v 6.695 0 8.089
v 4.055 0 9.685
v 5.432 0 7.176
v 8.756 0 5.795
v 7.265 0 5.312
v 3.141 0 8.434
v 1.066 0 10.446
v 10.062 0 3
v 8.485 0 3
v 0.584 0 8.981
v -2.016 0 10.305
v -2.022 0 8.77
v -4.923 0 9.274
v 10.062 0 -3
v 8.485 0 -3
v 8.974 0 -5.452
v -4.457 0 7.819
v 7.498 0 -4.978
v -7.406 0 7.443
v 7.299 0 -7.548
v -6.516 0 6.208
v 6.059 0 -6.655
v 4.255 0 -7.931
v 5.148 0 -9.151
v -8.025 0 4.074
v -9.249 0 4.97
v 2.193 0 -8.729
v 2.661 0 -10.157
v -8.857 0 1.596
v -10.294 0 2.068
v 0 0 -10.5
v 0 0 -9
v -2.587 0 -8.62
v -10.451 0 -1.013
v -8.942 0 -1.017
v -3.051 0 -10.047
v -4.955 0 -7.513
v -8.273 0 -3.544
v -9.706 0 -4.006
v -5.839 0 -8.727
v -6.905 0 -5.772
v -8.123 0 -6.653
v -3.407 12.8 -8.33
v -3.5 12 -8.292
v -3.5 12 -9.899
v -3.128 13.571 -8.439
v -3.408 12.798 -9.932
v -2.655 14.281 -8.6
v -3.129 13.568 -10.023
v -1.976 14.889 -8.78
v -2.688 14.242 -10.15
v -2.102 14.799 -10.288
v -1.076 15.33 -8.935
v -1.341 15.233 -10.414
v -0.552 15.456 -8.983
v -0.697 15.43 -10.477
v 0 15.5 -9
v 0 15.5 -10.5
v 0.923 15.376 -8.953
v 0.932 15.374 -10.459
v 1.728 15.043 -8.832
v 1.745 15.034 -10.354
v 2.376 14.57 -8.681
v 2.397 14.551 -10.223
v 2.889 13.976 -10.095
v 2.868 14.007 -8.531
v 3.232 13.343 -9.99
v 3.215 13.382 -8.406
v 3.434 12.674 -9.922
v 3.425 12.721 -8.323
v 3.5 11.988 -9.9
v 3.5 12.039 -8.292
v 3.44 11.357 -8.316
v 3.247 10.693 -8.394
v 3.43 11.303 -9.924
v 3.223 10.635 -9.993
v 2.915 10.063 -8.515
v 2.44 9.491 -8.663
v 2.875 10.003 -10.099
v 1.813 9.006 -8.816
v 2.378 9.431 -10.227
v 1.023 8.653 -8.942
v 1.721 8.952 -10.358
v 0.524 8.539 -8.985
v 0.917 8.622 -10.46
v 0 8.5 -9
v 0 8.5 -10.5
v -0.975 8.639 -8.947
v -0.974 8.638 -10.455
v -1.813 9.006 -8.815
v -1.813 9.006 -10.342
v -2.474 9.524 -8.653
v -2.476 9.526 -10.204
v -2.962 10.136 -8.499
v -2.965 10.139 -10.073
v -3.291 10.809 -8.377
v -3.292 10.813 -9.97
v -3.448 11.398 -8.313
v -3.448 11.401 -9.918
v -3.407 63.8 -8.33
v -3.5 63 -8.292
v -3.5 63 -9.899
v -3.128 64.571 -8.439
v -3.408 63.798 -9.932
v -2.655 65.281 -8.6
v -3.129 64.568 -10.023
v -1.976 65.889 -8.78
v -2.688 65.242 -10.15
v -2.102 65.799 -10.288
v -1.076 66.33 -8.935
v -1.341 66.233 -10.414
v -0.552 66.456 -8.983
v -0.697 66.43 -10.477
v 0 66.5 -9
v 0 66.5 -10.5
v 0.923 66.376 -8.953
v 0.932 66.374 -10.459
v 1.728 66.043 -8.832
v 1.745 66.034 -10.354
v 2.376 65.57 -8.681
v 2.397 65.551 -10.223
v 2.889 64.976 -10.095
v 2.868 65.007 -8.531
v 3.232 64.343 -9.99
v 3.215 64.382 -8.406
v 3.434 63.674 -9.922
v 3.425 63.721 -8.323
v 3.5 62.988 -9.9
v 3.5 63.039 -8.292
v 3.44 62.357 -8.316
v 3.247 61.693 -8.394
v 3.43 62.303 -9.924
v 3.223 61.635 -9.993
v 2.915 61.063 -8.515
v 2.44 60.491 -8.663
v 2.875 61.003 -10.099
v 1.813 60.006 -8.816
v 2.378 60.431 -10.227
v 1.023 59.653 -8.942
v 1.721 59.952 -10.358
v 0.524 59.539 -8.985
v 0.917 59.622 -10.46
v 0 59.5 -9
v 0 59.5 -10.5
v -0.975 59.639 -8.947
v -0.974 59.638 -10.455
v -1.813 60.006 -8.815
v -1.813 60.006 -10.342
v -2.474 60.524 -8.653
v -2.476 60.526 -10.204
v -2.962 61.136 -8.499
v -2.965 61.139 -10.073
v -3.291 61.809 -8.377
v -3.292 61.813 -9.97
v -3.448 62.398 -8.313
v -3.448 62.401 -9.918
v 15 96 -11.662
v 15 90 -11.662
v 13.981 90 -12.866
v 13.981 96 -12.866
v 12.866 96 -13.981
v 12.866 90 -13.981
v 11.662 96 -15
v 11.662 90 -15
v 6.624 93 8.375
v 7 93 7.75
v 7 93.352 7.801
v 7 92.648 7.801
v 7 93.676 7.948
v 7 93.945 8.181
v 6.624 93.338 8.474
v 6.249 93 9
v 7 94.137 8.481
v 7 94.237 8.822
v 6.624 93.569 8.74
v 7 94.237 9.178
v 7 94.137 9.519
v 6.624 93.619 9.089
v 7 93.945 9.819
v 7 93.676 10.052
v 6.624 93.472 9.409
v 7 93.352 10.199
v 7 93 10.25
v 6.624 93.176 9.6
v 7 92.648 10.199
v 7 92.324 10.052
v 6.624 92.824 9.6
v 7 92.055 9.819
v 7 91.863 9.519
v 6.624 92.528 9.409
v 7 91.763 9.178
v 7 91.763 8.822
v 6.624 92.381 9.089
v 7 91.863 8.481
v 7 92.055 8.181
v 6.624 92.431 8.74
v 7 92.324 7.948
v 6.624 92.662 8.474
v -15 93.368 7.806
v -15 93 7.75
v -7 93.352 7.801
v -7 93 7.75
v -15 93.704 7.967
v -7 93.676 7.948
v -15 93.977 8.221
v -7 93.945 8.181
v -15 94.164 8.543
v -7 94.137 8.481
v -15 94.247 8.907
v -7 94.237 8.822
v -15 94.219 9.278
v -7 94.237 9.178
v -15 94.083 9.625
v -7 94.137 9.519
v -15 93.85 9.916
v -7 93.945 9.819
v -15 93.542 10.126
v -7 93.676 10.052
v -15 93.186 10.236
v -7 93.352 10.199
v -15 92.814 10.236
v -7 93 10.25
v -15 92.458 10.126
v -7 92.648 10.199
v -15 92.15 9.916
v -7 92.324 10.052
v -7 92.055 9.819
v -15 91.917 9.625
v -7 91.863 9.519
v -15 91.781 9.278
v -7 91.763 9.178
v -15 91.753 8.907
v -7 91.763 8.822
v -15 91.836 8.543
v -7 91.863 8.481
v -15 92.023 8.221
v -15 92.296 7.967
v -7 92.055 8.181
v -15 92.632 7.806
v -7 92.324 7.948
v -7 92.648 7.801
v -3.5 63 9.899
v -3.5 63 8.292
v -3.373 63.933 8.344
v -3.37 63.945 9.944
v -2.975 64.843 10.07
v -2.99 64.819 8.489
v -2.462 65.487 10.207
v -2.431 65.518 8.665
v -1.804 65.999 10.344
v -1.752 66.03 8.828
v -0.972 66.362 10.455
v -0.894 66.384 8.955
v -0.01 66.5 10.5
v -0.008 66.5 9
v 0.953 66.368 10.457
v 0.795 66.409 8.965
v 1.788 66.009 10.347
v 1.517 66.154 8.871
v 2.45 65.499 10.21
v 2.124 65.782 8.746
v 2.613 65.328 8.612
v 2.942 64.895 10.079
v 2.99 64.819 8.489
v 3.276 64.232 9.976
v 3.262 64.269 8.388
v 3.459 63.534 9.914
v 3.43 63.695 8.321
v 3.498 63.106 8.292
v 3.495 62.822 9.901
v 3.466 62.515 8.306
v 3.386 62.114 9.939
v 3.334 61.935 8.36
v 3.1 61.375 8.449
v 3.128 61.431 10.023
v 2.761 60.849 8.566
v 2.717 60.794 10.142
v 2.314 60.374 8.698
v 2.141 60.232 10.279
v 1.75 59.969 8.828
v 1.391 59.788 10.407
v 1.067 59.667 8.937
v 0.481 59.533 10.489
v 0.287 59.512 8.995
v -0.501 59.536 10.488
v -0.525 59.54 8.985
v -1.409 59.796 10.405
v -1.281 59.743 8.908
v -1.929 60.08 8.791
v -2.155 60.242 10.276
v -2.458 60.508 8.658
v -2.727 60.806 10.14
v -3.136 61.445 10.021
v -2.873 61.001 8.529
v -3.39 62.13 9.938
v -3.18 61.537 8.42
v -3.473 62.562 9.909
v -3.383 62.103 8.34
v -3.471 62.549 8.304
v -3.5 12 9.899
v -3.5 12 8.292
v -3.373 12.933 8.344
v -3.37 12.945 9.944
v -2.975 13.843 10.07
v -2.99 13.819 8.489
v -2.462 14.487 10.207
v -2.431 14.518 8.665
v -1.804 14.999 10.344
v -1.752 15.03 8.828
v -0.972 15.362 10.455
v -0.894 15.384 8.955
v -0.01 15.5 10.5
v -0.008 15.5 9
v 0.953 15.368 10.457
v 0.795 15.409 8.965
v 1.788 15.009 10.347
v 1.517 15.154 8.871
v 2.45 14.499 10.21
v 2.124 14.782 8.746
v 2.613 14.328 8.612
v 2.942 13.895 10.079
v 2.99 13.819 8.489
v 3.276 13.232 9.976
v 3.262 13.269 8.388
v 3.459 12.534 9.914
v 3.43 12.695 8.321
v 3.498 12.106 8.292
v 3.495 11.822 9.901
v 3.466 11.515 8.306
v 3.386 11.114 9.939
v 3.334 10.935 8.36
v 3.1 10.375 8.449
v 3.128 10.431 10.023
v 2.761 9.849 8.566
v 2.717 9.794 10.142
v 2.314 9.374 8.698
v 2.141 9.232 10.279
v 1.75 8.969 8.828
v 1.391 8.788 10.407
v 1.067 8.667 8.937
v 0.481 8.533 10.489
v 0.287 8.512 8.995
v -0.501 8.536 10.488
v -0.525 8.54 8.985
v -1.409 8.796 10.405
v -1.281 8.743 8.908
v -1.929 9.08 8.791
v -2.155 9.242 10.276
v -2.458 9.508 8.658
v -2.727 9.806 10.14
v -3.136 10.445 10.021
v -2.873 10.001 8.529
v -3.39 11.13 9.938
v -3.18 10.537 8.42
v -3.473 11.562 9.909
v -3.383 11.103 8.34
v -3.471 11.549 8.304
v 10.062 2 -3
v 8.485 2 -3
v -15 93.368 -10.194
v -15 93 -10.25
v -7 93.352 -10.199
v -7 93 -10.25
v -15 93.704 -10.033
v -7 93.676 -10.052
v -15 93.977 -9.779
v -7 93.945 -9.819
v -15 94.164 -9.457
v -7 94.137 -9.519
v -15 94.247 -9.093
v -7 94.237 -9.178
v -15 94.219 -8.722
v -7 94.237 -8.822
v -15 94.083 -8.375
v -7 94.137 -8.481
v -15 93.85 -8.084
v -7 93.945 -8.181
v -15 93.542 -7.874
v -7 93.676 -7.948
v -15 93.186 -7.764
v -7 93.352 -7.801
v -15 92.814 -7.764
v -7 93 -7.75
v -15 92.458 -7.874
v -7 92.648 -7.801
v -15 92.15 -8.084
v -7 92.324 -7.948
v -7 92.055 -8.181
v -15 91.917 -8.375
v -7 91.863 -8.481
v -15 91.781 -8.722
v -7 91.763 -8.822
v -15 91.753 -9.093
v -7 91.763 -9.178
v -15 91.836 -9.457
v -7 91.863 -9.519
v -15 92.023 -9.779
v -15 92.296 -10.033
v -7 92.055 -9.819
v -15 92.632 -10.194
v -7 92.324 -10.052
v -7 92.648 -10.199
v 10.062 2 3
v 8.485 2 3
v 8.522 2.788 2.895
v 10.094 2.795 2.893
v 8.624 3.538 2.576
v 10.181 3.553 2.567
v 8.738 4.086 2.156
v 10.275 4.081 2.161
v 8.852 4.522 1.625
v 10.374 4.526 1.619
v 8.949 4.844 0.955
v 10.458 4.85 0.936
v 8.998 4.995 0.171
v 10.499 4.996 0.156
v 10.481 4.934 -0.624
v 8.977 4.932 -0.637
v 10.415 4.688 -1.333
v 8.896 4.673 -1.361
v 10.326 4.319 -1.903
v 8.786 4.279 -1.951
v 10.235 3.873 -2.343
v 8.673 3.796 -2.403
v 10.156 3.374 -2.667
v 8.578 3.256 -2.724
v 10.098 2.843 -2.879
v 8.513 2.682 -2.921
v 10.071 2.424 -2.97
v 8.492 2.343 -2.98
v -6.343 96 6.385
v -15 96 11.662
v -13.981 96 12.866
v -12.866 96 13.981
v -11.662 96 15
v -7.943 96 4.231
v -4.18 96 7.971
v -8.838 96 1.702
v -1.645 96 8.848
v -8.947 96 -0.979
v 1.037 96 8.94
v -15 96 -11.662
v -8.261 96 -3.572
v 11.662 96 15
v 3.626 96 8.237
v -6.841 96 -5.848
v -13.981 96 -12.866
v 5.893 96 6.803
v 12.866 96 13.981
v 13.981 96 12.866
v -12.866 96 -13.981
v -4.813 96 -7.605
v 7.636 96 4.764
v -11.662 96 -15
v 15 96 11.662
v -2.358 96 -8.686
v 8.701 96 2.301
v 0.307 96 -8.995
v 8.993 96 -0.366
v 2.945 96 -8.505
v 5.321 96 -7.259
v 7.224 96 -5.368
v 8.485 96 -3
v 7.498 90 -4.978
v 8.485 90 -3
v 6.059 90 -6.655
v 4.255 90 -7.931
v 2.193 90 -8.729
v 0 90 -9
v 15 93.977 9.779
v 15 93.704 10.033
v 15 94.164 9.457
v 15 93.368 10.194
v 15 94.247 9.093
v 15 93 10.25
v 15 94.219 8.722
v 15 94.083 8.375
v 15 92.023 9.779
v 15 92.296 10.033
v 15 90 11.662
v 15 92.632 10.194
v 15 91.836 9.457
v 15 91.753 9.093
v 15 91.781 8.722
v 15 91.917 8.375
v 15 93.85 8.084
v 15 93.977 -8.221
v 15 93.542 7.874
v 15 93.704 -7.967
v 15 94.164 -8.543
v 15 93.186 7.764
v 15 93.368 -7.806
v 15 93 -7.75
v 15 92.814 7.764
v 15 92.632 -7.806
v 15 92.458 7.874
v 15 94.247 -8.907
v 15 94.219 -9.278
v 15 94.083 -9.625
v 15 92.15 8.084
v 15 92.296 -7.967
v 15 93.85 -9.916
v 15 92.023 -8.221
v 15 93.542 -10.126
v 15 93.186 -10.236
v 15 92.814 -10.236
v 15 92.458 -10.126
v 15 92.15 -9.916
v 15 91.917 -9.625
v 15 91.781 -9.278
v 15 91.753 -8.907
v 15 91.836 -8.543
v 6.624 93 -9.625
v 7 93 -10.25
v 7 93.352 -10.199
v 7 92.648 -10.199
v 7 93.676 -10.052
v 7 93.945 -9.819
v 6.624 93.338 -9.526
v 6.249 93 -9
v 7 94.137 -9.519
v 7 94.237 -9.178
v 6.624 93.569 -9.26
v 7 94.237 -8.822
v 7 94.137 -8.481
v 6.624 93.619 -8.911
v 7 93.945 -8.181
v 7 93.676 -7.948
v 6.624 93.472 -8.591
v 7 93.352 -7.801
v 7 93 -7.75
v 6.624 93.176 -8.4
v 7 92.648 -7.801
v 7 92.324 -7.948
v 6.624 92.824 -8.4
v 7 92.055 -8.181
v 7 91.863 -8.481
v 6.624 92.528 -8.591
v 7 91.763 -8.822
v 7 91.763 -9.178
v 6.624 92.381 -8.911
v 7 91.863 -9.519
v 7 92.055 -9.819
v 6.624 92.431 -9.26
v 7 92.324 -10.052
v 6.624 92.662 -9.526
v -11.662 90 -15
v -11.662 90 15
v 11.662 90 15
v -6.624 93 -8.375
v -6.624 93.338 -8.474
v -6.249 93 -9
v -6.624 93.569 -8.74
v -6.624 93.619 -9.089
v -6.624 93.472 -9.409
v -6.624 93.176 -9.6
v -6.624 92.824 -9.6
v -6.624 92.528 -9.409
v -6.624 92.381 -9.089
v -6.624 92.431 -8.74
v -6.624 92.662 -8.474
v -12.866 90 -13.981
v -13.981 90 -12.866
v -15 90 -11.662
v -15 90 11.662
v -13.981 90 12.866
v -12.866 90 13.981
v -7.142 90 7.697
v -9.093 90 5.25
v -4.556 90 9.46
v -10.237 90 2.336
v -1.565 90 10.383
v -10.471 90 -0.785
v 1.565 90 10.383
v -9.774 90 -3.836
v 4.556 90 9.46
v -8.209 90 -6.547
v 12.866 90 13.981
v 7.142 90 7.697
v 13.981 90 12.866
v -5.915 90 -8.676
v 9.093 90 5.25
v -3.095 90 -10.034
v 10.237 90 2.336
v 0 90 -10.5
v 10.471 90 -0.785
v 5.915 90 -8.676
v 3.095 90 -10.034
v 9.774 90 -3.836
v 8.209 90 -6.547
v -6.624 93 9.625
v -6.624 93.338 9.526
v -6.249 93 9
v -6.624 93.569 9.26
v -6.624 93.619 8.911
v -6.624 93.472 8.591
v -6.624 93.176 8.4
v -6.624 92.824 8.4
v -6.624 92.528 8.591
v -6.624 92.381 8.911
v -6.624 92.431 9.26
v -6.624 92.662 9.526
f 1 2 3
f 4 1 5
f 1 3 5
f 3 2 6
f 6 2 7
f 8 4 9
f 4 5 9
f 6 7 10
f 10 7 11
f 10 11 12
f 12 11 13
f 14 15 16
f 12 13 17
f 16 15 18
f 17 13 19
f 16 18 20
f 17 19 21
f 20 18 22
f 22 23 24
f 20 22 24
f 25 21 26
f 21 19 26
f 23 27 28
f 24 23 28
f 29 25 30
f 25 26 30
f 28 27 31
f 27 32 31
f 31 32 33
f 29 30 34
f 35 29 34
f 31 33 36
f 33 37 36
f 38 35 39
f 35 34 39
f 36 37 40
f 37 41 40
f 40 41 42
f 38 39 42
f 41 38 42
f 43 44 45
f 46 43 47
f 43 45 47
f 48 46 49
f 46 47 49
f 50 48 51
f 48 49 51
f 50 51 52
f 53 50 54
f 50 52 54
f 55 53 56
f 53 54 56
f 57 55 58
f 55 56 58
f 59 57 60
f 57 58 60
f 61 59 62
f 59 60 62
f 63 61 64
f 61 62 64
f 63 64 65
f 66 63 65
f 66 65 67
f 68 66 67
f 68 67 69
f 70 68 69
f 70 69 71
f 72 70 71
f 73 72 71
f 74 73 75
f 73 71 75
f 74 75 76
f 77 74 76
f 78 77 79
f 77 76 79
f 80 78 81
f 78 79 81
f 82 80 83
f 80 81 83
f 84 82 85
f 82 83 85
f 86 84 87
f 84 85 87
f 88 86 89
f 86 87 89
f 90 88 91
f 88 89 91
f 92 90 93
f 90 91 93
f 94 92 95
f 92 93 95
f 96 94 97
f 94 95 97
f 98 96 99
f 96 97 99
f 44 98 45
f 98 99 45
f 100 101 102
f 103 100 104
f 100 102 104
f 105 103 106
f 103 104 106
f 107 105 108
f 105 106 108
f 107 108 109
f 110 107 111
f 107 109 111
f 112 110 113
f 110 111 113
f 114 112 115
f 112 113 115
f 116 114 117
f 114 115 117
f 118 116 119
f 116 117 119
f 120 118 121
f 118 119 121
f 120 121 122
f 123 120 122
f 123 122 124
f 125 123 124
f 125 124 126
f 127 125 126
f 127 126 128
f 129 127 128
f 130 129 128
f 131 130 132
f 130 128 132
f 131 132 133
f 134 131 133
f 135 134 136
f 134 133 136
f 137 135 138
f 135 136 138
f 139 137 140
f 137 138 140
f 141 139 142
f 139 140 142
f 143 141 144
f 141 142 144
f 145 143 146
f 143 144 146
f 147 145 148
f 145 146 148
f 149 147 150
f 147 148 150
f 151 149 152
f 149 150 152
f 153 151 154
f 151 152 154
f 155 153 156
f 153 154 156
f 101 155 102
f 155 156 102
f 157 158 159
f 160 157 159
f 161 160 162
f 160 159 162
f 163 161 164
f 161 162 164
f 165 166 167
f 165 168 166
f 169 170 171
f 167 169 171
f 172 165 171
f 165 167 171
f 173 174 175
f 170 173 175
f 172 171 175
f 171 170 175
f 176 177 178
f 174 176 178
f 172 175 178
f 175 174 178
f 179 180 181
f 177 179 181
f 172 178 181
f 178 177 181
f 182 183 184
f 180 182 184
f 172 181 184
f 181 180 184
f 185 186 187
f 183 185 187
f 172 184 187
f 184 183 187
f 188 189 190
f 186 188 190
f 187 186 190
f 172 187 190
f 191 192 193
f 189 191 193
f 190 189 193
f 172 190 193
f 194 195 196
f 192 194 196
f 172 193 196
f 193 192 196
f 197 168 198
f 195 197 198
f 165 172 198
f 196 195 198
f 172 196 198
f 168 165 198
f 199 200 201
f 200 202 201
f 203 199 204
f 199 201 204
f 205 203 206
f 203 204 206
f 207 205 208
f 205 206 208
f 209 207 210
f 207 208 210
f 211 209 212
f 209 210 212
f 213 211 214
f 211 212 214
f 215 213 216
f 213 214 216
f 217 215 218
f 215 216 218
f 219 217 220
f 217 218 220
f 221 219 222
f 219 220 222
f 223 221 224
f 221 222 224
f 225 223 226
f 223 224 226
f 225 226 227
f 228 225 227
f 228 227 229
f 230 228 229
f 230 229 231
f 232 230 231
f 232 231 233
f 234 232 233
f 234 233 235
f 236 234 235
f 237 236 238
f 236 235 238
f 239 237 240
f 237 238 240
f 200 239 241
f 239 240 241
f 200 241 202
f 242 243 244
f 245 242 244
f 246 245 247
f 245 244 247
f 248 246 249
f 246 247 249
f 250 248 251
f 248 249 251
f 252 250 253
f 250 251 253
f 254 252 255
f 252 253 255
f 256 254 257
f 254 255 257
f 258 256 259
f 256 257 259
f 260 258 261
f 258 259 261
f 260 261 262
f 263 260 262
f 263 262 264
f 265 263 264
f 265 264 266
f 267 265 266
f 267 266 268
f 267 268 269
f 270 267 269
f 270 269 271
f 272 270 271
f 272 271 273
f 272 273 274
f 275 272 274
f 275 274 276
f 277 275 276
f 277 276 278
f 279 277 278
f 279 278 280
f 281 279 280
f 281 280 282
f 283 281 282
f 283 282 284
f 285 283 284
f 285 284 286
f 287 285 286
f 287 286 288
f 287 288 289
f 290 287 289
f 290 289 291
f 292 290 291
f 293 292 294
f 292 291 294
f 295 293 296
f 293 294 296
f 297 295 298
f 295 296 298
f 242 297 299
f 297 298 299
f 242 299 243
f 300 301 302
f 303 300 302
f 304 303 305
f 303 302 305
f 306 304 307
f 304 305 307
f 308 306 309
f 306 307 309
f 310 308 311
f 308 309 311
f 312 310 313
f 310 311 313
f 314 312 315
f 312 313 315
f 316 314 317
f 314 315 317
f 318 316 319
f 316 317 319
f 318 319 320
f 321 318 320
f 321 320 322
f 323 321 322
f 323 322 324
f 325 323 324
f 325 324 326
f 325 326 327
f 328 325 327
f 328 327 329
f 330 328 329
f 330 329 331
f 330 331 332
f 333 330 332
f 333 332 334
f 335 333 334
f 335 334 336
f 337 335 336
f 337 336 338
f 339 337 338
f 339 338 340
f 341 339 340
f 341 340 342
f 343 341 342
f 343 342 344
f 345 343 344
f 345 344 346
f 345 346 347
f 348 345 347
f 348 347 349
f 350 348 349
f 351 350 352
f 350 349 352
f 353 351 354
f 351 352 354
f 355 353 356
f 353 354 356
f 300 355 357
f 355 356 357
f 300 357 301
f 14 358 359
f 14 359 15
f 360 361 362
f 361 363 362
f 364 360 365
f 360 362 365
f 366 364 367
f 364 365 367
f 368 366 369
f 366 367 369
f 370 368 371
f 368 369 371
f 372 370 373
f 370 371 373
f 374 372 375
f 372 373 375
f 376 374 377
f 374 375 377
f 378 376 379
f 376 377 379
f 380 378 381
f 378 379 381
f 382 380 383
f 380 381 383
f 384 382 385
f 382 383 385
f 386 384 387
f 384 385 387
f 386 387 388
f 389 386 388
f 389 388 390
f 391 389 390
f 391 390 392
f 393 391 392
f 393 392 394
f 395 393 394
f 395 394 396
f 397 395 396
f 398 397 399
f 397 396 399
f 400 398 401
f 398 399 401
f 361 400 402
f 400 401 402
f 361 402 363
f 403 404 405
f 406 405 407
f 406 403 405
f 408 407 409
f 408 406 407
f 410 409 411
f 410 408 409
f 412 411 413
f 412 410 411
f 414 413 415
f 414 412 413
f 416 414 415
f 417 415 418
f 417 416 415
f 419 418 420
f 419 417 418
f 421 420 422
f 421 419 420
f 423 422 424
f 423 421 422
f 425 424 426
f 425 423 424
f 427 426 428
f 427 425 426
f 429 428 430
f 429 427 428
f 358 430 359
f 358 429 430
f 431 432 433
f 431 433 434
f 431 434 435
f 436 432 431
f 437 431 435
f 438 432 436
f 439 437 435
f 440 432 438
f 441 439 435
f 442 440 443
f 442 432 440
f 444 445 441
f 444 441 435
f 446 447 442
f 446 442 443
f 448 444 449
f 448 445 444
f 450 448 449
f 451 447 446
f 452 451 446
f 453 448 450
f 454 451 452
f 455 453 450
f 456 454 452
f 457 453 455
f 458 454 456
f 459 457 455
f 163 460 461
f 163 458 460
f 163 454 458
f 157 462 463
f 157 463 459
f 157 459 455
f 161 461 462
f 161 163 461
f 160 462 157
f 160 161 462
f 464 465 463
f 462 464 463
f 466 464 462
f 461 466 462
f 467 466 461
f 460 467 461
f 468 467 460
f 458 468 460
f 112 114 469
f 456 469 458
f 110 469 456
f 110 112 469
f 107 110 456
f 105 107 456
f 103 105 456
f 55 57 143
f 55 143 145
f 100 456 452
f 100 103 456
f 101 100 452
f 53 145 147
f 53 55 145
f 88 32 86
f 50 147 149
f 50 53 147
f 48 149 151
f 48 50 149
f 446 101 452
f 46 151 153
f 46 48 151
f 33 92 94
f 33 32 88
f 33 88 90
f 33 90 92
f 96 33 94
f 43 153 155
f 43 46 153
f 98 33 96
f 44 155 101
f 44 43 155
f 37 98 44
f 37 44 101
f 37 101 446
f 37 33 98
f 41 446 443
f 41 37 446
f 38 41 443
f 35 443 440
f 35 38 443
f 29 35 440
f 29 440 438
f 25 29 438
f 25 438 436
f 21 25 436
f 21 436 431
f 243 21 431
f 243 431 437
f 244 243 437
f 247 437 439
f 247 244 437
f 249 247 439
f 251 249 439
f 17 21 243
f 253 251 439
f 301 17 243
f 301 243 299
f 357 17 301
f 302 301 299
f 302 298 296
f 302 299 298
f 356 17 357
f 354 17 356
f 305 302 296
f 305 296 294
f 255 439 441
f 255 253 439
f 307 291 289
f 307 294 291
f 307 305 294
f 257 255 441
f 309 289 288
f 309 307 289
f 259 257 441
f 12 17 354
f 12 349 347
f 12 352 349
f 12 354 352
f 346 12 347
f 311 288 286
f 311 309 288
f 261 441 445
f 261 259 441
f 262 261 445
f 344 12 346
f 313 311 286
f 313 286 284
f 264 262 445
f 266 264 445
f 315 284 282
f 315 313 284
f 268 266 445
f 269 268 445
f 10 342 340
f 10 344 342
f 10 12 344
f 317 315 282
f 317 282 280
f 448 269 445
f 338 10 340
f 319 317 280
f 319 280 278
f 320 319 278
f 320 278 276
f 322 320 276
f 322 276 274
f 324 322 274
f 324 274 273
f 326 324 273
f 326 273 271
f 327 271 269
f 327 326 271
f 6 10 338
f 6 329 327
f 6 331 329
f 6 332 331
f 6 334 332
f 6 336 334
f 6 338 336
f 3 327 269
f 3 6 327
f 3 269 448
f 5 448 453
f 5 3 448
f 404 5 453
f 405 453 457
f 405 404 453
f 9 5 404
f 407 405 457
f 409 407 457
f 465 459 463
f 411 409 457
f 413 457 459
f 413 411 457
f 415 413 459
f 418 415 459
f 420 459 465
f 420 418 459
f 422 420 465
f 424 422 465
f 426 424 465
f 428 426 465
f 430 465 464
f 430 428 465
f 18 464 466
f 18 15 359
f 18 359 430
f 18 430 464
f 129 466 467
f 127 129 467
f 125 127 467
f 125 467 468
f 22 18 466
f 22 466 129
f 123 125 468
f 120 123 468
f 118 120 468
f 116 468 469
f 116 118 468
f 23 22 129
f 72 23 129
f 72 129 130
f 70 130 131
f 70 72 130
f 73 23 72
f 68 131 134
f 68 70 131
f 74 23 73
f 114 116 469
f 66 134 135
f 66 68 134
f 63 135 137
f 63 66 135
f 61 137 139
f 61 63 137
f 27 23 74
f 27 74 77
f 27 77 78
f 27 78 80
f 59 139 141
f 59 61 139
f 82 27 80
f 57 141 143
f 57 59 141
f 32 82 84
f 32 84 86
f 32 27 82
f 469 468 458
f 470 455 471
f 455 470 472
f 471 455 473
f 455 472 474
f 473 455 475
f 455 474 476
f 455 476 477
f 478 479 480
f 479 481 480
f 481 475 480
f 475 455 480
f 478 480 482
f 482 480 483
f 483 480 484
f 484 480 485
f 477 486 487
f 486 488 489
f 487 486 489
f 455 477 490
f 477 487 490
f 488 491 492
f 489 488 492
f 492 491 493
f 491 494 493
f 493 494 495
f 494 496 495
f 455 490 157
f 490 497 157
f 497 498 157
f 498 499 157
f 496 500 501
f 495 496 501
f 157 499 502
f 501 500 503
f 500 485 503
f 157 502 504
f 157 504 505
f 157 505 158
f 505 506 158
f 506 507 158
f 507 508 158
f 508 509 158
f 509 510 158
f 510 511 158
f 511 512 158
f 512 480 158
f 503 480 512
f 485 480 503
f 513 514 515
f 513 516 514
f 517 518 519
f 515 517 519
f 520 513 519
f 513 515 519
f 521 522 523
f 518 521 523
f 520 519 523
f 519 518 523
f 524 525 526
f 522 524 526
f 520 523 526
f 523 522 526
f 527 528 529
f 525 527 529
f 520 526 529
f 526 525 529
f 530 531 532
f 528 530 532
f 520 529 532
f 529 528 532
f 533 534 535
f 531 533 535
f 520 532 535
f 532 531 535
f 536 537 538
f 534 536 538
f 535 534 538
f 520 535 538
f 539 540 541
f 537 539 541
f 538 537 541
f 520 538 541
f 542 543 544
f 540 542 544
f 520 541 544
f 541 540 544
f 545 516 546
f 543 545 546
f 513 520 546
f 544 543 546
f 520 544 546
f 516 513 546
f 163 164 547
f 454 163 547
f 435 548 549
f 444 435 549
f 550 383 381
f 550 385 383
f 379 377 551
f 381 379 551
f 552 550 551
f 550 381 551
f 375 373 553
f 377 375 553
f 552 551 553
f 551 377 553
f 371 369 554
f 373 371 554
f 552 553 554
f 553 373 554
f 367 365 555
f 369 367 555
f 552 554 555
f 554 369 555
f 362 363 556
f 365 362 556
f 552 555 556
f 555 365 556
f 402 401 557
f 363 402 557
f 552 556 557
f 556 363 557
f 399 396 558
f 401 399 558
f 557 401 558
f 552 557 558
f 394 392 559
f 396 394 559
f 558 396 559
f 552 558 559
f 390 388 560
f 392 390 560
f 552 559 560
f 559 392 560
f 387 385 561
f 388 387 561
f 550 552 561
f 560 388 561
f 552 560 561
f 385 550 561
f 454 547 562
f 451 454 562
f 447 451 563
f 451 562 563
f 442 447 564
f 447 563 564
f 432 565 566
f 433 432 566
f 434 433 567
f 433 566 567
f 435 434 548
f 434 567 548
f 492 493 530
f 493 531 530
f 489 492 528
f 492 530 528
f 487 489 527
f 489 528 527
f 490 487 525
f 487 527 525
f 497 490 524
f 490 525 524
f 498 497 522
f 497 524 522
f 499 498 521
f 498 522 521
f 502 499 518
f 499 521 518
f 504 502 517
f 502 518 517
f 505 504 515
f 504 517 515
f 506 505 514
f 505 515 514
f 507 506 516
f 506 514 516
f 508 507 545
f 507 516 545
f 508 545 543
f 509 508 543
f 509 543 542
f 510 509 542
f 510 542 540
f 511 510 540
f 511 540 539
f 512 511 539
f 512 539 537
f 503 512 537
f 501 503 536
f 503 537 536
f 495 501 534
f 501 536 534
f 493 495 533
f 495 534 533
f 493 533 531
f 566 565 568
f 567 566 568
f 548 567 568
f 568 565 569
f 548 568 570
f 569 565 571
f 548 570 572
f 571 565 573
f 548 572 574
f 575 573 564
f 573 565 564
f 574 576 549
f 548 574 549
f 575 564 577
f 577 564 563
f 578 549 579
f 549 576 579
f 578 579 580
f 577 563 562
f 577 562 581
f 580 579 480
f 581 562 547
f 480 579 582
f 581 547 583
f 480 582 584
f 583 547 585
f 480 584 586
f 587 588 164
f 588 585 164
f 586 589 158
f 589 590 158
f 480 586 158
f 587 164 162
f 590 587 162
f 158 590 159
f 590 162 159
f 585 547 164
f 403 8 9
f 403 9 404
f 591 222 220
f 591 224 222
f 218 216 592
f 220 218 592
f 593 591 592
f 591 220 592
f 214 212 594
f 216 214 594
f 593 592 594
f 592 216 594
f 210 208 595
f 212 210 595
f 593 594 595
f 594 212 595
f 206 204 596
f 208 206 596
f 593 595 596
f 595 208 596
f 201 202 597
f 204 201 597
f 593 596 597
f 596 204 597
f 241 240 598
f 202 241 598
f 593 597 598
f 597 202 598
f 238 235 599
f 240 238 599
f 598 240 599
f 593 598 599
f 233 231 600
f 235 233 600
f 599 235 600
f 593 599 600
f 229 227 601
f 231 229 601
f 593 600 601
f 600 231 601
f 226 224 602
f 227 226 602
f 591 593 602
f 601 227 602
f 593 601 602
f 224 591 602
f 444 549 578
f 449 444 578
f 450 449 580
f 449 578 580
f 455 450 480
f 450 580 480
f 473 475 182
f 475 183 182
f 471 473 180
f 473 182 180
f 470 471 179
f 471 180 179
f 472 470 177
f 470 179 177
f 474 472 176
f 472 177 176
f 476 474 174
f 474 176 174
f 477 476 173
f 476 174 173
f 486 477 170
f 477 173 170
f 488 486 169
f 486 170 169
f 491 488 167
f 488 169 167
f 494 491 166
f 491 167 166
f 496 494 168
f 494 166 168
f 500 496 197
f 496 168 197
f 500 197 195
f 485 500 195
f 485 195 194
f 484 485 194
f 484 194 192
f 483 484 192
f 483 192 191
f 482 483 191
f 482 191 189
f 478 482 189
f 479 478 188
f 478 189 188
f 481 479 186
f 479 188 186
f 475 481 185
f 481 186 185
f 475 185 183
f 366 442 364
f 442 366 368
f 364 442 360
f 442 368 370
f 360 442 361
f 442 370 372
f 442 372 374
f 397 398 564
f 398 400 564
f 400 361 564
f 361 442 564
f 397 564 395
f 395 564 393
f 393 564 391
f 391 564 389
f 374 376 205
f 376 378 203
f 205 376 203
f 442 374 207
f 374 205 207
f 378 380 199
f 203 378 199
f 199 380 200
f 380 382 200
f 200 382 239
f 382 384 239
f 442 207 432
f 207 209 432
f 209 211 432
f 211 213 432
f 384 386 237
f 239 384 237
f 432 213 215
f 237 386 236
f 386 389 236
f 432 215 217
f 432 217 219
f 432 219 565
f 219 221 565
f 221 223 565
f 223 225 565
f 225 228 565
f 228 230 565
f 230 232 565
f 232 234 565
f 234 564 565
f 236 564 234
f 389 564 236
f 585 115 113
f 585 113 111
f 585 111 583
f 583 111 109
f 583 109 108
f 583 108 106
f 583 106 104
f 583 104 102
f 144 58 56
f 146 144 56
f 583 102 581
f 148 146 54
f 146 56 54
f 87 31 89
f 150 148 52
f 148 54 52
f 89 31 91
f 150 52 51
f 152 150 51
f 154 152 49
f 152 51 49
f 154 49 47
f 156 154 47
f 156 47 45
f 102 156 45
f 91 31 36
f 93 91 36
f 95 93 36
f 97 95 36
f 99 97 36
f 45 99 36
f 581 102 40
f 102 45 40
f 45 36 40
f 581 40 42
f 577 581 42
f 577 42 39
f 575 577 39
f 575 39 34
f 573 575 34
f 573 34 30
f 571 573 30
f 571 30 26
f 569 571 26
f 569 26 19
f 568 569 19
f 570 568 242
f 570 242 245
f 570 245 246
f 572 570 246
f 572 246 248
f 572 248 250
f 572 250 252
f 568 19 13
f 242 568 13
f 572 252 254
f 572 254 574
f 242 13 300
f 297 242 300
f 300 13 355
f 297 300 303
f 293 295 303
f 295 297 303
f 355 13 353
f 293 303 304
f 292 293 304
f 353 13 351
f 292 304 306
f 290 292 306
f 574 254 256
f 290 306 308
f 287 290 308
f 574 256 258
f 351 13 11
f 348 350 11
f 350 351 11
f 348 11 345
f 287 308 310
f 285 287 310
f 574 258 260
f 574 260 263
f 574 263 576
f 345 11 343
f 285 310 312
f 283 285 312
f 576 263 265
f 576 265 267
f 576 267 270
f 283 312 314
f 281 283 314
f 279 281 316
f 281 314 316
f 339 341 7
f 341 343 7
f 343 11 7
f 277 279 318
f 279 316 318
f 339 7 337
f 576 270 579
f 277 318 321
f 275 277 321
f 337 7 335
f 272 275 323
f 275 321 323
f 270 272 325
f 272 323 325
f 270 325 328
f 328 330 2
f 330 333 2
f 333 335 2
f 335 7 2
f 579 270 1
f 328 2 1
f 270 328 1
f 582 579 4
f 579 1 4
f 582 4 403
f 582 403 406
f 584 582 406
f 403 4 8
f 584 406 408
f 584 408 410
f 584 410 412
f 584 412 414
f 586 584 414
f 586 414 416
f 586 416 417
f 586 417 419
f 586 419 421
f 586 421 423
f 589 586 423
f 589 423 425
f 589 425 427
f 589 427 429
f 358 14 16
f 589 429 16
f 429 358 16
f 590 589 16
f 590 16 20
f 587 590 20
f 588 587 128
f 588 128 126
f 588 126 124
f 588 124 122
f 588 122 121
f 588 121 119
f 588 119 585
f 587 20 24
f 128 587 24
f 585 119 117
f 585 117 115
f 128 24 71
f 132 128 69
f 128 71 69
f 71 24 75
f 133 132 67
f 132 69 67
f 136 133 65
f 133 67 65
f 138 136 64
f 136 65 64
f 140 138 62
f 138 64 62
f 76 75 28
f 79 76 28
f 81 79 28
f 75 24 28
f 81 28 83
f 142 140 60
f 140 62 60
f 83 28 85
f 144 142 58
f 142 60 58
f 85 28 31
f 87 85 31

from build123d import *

# Parameters (mm, degrees)
SKETCH_1_R               = 10.5
SKETCH_1_R_2             = 9
EXTRUDE_1_DEPTH          = 90
CUT_EXTRUDE_1_REACH      = 95.012
CUT_EXTRUDE_1_END_RADIUS = 9
SKETCH_4_R               = 3.5
CUT_EXTRUDE_2_DEPTH      = 94.012096118
SKETCH_5_R               = 9
EXTRUDE_2_DEPTH          = 6
HOLE_WIZARD_M3_1_D       = 2.5
HOLE_WIZARD_M3_1_DEPTH   = 8
HOLE_WIZARD_M3_1_TIP     = 0.751075774
HOLE_WIZARD_M3_2_D       = 2.5
HOLE_WIZARD_M3_2_DEPTH   = 8
HOLE_WIZARD_M3_2_TIP     = 0.751075774


with BuildPart() as part:
    # 草图1 → 凸台-拉伸1 (new body)
    with BuildSketch(Plane(origin=(0, 0, 0), x_dir=(1, 0, 0), z_dir=(0, 1, 0))):
        with Locations(Location((0, 0, 0), (0, 0, 90))):
            Circle(SKETCH_1_R)
        with Locations(Location((0, 0, 0), (0, 0, 90))):
            Circle(SKETCH_1_R_2, mode=Mode.SUBTRACT)
    extrude(amount=EXTRUDE_1_DEPTH)

    # 切除-拉伸1: up to this cylinder (the profile starts outside it)
    cut_extrude_1_end = Plane(origin=(0, 2.229558, 0), z_dir=(0, -1, 0)) * Cylinder(CUT_EXTRUDE_1_END_RADIUS, 209.024, mode=Mode.PRIVATE)
    # 草图3 → 切除-拉伸1 (cut, up to the surface)
    with BuildSketch(Plane(origin=(10.5, 0, 0), x_dir=(0, 0, -1), z_dir=(1, 0, 0)), mode=Mode.PRIVATE) as cut_extrude_1_sk1:
        with BuildLine():
            Line((-3, 0), (-3, 2))
            ThreePointArc((-3, 2), (0, 5), (3, 2))
            Line((3, 2), (3, 0))
            Line((3, 0), (-3, 0))
        make_face()
    cut_extrude_1_tool1 = extrude(cut_extrude_1_sk1.sketch, amount=-CUT_EXTRUDE_1_REACH, mode=Mode.PRIVATE) - cut_extrude_1_end
    add(cut_extrude_1_tool1.solids().sort_by_distance((10.5, 2.229558, 0))[0], mode=Mode.SUBTRACT)

    # 草图4 → 切除-拉伸2 (cut, through all)
    with BuildSketch(Plane(origin=(0, 0, -10.5), x_dir=(-1, 0, 0), z_dir=(0, 0, -1))):
        with Locations((0, 63)):
            Circle(SKETCH_4_R)
        with Locations((0, 12)):
            Circle(SKETCH_4_R)
    extrude(amount=-CUT_EXTRUDE_2_DEPTH, mode=Mode.SUBTRACT)

    # 草图5 → 凸台-拉伸2 (add)
    with BuildSketch(Plane(origin=(0, 90, 0), x_dir=(1, 0, 0), z_dir=(0, 1, 0))):
        with BuildLine():
            Line((11.66190379, 15), (-11.66190379, 15))
            ThreePointArc((-11.66190379, 15), (-13.435028843, 13.435028843), (-15, 11.66190379))
            Line((-15, 11.66190379), (-15, -11.66190379))
            ThreePointArc((-15, -11.66190379), (-13.435028843, -13.435028843), (-11.66190379, -15))
            Line((-11.66190379, -15), (11.66190379, -15))
            ThreePointArc((11.66190379, -15), (13.435028843, -13.435028843), (15, -11.66190379))
            Line((15, -11.66190379), (15, 11.66190379))
            ThreePointArc((15, 11.66190379), (13.435028843, 13.435028843), (11.66190379, 15))
        make_face()
        with Locations(Location((0, 0, 0), (0, 0, 19.471220634))):
            Circle(SKETCH_5_R, mode=Mode.SUBTRACT)
    extrude(amount=EXTRUDE_2_DEPTH)

    # M3 螺纹孔1
    with Locations(Plane(origin=(15, 0, 0), x_dir=(0, 0, -1), z_dir=(1, 0, 0))):
        with Locations((-9, 93), (9, 93)):
            Hole(HOLE_WIZARD_M3_1_D / 2, depth=HOLE_WIZARD_M3_1_DEPTH)
            with Locations((0, 0, -(HOLE_WIZARD_M3_1_DEPTH + HOLE_WIZARD_M3_1_TIP / 2))):  # 118° drill point
                Cone(0, HOLE_WIZARD_M3_1_D / 2, HOLE_WIZARD_M3_1_TIP, mode=Mode.SUBTRACT)

    # M3 螺纹孔2
    with Locations(Plane.ZY.offset(15)):
        with Locations((-9, 93), (9, 93)):
            Hole(HOLE_WIZARD_M3_2_D / 2, depth=HOLE_WIZARD_M3_2_DEPTH)
            with Locations((0, 0, -(HOLE_WIZARD_M3_2_DEPTH + HOLE_WIZARD_M3_2_TIP / 2))):  # 118° drill point
                Cone(0, HOLE_WIZARD_M3_2_D / 2, HOLE_WIZARD_M3_2_TIP, mode=Mode.SUBTRACT)


solid = part.part
